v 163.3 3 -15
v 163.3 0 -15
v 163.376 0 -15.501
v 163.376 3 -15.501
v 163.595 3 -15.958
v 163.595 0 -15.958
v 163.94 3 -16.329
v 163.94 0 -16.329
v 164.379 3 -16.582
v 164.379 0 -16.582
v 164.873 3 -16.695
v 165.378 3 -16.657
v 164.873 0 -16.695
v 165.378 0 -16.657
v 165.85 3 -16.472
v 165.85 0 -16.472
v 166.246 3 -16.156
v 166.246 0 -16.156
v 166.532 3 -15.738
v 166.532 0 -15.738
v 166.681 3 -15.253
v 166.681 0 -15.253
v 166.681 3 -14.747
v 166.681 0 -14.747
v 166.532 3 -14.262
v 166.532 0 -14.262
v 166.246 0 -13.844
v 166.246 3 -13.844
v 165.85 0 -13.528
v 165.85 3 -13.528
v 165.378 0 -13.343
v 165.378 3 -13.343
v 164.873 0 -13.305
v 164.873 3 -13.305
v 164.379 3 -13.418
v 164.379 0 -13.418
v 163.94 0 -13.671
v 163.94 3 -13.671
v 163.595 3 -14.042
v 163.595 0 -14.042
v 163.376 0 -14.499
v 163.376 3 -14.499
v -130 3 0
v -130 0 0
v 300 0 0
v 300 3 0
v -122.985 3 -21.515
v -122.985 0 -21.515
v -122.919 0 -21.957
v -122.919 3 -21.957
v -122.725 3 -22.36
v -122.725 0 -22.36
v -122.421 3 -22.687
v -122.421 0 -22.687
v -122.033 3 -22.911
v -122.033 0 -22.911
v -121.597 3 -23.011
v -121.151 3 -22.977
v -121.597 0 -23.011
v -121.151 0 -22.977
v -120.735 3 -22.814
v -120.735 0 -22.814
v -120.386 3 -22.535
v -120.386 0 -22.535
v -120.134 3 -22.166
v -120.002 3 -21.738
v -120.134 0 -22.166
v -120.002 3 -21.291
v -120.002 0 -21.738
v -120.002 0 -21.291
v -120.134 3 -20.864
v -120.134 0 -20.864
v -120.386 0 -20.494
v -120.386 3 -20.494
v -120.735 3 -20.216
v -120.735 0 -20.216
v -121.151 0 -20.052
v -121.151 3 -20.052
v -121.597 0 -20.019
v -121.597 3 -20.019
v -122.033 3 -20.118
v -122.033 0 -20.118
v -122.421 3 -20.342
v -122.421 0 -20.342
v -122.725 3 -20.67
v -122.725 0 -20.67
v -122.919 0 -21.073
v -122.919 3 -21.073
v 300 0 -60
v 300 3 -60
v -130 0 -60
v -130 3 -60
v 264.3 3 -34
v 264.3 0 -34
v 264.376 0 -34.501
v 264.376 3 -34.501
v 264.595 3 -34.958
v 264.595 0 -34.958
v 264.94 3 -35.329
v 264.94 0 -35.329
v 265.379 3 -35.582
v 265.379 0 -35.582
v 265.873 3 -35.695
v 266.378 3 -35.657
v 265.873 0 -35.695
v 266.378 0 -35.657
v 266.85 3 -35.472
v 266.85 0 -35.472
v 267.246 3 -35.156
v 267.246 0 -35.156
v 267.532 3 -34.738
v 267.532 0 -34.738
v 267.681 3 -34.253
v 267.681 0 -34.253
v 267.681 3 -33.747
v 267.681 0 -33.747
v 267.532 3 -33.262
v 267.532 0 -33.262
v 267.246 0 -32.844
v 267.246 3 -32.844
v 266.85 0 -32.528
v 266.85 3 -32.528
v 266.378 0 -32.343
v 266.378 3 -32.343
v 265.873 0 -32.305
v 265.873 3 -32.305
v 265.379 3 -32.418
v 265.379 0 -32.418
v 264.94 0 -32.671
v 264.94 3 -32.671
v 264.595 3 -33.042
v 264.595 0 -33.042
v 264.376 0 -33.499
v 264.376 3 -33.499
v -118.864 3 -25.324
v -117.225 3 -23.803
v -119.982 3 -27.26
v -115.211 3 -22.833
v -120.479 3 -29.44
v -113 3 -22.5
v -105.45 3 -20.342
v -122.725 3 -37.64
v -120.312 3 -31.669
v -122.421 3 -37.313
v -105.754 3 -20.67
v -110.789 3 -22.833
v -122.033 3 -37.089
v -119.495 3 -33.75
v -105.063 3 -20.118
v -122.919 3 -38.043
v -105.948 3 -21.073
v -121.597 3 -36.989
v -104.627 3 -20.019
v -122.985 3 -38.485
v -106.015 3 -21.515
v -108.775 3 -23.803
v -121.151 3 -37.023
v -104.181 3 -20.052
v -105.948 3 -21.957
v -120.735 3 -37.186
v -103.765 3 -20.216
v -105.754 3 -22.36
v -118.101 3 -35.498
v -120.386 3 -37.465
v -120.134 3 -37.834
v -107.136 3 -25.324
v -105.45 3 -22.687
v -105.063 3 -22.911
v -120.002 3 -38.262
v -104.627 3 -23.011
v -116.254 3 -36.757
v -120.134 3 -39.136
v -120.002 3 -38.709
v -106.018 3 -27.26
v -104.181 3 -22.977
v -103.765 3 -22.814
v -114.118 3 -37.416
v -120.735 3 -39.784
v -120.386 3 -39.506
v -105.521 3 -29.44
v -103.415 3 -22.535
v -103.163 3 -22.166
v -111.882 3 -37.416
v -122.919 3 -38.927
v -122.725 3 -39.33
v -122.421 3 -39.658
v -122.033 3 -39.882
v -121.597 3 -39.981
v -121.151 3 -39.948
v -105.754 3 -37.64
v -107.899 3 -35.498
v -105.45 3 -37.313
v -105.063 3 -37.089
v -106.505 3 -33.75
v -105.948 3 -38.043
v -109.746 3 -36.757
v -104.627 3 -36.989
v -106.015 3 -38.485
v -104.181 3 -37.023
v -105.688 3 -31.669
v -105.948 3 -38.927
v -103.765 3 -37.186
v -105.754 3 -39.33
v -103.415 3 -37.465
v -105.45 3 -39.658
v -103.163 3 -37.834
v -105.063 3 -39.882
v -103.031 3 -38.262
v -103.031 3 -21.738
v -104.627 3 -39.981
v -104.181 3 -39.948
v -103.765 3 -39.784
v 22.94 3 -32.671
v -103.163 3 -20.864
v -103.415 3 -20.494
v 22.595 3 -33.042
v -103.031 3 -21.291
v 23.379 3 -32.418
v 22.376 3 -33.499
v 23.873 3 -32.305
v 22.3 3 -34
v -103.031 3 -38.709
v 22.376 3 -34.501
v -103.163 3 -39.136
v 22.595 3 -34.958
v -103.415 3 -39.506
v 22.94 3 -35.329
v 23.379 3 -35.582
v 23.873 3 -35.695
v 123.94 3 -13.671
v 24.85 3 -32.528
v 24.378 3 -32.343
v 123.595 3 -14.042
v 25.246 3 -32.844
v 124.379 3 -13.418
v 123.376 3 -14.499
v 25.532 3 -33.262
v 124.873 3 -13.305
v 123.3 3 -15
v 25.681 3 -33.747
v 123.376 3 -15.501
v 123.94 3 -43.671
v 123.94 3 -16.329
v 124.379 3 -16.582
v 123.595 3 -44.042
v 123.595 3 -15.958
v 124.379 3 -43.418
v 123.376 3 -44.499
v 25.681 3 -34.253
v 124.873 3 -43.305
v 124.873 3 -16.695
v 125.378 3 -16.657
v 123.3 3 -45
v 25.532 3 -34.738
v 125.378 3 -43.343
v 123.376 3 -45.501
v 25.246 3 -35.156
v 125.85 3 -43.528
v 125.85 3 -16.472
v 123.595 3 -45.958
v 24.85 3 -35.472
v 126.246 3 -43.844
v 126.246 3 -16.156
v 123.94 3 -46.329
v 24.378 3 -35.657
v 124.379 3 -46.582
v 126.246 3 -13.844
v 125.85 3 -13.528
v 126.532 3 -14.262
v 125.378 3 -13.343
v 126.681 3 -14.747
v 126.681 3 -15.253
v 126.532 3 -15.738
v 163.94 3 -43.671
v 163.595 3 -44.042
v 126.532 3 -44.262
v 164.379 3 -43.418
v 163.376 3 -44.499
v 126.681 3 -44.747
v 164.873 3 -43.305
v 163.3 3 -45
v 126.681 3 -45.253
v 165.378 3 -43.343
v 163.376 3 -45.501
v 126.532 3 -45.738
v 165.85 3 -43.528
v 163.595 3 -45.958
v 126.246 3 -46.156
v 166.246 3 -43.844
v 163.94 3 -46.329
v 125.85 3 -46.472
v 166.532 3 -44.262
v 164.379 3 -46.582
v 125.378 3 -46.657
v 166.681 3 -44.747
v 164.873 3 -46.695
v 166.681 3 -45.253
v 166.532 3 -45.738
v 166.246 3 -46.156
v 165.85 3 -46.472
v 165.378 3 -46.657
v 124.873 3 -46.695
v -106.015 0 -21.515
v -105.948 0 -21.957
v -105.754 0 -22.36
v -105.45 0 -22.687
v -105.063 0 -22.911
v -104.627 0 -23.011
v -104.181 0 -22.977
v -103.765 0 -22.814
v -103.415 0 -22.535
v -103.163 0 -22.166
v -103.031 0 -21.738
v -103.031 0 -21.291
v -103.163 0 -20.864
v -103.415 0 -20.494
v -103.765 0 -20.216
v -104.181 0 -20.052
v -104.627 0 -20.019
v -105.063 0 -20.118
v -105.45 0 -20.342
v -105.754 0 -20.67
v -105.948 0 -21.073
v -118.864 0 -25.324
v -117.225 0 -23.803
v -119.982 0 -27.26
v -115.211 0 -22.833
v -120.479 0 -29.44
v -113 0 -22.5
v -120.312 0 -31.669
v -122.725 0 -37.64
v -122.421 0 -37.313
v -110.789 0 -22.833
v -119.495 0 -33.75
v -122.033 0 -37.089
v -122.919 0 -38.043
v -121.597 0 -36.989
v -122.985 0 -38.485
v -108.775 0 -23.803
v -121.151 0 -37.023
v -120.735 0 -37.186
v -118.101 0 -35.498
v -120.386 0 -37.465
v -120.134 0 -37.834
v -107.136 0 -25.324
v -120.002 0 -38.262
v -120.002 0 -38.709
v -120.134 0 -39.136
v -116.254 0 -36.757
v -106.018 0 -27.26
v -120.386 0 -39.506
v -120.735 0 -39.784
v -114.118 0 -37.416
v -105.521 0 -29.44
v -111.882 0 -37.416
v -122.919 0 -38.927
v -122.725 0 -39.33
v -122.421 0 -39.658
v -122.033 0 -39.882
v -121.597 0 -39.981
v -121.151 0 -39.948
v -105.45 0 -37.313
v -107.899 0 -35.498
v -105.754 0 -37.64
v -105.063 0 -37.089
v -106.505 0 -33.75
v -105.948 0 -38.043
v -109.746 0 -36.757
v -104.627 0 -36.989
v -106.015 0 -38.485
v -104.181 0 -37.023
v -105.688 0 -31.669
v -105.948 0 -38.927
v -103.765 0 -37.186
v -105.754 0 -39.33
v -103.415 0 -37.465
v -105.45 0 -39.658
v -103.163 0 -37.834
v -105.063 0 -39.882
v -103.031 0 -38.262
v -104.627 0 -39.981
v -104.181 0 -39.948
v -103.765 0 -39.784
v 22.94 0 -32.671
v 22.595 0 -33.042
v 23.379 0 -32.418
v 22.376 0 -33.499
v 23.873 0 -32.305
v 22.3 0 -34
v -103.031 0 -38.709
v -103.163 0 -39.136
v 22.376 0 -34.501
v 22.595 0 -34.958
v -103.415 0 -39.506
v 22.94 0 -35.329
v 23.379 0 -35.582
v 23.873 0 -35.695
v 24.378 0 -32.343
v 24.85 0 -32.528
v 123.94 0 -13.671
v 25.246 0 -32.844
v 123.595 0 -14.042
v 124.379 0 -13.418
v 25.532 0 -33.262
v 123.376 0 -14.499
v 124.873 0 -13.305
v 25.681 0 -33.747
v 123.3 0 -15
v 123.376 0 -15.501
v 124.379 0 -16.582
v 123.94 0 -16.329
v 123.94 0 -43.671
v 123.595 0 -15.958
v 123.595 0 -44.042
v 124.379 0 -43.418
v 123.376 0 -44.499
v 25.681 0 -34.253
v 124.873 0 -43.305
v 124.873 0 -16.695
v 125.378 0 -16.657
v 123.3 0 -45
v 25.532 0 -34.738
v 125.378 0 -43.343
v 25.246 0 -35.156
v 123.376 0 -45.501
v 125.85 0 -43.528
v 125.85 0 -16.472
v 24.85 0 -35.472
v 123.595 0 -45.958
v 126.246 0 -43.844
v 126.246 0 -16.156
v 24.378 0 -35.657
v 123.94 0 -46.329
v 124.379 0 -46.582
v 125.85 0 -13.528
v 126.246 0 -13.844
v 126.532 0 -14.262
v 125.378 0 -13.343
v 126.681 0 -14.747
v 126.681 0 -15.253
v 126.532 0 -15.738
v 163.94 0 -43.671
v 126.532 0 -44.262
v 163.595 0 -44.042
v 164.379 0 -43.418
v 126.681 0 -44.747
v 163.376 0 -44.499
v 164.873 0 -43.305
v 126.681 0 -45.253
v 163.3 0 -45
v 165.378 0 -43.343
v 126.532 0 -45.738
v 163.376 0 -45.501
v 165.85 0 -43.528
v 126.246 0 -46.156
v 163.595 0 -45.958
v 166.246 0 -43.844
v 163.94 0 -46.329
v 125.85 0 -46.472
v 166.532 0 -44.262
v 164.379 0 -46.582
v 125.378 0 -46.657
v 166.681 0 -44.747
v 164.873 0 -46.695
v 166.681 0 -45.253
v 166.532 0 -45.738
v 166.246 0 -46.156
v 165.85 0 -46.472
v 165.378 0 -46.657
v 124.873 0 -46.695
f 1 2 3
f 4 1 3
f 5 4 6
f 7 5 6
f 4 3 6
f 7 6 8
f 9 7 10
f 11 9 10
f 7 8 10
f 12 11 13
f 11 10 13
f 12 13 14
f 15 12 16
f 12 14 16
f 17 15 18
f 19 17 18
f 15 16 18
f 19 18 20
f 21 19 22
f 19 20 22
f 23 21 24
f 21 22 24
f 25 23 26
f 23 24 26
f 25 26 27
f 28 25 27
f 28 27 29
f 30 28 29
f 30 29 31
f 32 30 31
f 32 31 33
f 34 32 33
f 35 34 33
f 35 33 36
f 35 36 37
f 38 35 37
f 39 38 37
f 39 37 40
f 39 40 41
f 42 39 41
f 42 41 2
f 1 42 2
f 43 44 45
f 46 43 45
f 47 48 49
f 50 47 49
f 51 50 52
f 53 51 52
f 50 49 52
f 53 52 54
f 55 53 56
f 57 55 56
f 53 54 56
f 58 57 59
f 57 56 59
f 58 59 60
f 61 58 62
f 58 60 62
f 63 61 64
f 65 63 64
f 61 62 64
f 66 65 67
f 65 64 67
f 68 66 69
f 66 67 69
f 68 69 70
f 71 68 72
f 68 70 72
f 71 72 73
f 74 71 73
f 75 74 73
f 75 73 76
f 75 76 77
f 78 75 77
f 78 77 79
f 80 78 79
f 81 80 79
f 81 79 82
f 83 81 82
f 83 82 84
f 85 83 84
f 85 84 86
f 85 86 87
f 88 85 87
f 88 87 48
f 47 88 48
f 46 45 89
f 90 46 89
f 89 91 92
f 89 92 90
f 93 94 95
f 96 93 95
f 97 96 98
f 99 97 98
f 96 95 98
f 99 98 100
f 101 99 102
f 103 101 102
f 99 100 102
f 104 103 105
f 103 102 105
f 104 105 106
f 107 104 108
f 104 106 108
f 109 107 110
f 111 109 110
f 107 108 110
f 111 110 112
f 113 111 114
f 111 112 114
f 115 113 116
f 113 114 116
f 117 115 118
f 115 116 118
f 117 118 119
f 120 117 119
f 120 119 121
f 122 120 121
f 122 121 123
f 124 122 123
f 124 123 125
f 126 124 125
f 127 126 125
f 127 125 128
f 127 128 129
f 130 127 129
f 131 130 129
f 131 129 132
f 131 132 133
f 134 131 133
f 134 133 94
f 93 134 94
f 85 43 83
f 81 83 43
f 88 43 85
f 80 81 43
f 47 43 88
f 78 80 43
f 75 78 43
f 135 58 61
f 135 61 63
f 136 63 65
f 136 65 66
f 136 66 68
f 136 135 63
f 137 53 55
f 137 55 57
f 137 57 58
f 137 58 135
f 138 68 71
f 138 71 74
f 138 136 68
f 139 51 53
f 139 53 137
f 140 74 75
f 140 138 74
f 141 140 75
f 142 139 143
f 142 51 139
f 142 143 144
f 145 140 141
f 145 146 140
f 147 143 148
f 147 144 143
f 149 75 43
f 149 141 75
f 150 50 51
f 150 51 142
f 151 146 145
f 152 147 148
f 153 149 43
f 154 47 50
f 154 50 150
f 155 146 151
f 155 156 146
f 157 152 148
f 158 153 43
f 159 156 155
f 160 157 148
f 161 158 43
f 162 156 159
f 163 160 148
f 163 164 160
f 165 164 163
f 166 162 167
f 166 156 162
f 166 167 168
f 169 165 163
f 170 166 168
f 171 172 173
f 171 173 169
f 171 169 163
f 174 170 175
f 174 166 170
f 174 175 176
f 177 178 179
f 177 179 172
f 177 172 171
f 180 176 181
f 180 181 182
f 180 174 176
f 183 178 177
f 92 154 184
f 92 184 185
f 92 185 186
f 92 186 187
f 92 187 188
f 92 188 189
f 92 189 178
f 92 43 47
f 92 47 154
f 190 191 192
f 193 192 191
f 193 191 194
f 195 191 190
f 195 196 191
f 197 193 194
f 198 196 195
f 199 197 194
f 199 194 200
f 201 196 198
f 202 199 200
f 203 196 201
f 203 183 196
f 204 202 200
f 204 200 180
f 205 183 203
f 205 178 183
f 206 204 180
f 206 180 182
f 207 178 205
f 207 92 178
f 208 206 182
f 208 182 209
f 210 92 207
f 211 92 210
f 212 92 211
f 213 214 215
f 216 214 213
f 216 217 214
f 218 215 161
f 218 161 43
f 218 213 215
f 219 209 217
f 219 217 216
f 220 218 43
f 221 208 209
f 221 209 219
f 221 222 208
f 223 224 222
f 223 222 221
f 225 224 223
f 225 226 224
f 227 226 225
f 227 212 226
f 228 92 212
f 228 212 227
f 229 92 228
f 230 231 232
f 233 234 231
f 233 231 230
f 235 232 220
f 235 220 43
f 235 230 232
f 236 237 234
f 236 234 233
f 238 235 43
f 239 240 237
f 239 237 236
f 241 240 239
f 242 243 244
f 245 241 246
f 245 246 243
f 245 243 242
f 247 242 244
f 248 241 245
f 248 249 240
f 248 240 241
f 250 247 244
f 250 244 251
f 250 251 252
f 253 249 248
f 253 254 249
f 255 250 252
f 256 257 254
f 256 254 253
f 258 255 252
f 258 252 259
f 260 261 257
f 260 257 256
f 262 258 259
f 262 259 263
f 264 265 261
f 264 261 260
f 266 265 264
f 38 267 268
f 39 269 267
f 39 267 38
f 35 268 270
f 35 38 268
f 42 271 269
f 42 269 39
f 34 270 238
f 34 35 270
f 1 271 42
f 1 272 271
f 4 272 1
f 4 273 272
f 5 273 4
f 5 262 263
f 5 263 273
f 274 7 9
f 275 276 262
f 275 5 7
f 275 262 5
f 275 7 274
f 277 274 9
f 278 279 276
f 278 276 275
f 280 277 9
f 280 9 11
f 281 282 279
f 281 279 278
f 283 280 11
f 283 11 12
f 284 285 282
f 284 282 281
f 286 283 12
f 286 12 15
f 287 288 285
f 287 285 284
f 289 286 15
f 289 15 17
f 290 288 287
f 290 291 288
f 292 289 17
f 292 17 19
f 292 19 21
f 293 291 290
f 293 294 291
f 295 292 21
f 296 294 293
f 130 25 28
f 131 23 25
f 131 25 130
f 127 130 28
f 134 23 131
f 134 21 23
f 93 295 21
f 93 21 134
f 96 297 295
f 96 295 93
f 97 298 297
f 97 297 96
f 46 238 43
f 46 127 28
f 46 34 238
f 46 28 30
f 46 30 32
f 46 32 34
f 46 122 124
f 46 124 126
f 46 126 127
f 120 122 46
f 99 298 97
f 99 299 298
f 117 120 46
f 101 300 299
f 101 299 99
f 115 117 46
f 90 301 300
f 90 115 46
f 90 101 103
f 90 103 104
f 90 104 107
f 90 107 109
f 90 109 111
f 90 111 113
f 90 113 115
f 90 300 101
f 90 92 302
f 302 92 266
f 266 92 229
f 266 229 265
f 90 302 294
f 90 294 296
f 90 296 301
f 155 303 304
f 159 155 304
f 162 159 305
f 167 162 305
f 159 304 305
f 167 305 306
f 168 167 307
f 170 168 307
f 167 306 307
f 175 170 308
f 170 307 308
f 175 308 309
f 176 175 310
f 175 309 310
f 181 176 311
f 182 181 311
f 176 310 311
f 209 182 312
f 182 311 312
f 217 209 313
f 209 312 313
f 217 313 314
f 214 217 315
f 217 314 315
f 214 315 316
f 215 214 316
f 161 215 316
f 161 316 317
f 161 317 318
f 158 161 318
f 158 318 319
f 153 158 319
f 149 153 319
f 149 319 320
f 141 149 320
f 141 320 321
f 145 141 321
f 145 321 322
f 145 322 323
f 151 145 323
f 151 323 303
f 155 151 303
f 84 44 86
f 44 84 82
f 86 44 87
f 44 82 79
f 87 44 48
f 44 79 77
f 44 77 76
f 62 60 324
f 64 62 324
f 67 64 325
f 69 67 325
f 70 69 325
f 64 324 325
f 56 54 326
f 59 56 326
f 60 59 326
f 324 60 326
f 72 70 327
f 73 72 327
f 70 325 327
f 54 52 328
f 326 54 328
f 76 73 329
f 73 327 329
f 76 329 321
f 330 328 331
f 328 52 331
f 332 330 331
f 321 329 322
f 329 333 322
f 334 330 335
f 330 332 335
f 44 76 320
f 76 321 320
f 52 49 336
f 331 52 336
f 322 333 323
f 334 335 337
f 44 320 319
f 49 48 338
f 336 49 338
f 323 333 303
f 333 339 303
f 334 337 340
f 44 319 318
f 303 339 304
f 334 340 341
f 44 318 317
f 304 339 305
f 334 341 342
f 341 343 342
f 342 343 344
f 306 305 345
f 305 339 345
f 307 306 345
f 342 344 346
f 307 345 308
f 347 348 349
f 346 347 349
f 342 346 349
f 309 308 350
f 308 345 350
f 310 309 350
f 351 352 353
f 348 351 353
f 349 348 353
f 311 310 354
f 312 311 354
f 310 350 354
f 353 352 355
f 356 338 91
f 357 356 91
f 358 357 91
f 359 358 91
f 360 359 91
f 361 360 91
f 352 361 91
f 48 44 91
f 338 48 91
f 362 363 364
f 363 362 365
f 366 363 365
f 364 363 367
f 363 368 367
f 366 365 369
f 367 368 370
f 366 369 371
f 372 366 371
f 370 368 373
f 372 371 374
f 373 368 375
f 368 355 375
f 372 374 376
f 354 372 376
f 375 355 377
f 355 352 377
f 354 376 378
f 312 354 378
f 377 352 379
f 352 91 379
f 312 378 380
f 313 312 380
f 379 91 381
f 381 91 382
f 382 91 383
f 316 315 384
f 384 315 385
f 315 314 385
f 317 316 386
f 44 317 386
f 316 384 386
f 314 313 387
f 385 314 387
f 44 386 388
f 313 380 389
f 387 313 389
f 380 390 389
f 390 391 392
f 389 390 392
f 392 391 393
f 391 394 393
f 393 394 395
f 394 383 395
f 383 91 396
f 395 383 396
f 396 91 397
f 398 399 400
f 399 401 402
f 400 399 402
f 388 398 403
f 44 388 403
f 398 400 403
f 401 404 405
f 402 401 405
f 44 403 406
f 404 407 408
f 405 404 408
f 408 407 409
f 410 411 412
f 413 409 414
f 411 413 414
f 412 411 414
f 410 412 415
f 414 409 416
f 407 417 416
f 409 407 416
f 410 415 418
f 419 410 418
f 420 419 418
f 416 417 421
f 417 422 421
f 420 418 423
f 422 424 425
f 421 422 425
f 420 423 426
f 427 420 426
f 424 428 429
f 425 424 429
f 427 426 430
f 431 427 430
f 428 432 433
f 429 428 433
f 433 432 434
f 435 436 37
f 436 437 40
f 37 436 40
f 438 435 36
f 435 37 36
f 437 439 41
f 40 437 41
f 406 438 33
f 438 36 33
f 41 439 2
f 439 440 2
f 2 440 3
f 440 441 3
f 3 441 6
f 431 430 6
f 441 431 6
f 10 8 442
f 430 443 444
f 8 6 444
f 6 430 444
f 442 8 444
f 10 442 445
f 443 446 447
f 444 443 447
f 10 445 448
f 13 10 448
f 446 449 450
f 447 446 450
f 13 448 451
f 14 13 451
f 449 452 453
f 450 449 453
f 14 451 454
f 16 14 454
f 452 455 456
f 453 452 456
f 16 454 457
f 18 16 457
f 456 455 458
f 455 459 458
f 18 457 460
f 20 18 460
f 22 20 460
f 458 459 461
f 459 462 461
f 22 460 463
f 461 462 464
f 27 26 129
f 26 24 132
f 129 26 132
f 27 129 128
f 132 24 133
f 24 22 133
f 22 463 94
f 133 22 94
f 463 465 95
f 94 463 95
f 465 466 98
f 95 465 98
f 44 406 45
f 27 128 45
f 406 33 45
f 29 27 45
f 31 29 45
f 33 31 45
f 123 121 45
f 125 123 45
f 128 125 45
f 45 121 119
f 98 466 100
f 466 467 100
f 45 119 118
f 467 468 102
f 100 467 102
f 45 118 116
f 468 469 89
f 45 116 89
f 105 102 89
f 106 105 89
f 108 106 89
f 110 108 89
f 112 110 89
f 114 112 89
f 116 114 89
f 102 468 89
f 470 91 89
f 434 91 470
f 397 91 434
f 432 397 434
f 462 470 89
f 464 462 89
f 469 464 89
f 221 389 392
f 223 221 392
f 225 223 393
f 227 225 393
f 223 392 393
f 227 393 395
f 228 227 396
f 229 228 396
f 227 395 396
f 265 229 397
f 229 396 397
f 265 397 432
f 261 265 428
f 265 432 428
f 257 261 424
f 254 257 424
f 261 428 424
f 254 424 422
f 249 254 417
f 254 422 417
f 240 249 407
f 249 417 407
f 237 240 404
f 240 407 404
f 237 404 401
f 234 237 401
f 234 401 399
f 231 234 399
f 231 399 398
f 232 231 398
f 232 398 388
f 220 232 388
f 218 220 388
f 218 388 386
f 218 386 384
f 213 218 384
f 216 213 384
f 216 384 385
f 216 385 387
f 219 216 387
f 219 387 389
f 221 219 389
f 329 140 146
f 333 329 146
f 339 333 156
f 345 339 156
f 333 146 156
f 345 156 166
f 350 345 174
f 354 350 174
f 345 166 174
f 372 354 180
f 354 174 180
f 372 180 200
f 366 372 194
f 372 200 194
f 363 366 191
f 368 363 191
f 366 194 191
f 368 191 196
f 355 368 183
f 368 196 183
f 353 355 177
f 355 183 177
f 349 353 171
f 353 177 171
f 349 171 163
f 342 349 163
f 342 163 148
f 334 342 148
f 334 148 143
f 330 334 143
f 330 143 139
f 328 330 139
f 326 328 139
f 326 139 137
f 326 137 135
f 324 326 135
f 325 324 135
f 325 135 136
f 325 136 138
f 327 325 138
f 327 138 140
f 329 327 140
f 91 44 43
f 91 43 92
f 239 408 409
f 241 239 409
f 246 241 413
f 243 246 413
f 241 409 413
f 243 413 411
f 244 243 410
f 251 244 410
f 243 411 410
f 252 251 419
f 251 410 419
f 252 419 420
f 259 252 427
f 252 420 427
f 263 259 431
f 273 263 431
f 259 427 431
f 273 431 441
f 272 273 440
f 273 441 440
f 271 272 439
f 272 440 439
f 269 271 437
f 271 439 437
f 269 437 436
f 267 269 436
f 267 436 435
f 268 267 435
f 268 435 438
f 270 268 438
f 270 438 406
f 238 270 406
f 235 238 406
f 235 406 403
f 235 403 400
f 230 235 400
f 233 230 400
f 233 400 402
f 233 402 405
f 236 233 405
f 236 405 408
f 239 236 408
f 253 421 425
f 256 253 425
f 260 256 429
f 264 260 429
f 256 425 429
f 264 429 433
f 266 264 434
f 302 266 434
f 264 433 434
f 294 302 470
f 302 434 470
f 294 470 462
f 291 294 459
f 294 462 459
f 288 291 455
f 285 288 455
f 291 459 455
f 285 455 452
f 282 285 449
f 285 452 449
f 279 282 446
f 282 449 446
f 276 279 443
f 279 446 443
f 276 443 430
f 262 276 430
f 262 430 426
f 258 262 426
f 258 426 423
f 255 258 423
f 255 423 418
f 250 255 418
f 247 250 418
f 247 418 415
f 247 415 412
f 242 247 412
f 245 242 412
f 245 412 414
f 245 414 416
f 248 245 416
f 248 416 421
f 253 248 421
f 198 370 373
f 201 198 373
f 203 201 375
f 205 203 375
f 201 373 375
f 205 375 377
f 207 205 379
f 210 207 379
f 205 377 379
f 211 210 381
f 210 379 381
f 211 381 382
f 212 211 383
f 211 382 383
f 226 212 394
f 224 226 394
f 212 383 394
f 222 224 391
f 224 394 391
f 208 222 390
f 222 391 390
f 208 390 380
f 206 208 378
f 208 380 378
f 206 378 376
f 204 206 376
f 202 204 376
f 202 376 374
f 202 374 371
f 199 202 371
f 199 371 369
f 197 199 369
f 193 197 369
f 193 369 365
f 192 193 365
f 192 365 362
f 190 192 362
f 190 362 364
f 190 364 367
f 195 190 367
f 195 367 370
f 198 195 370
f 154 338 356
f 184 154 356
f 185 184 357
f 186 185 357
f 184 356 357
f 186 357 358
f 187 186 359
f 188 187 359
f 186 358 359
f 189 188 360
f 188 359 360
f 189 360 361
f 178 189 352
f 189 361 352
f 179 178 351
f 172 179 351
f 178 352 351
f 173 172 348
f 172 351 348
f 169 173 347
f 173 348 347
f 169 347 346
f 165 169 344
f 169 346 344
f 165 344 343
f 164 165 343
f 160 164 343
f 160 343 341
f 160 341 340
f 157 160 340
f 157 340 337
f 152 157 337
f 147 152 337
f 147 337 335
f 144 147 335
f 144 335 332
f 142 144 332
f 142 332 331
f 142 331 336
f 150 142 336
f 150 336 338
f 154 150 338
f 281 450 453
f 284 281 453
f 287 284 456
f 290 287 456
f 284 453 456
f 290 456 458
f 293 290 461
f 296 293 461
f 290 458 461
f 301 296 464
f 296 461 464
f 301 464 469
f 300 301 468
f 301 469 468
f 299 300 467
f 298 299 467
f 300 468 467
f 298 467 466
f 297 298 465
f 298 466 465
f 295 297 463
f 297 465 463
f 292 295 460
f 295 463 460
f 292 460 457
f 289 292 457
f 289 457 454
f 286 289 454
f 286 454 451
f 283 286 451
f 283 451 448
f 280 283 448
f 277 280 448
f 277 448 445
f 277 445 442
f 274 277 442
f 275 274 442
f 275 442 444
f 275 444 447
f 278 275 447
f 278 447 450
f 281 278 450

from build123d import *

# Parameters (mm, degrees)
SKETCH1_W                 = 430
SKETCH1_H                 = 60
BOSS_EXTRUDE1_DEPTH       = 3
OTW_R_POD_RUB_M31_D       = 3.4
SKETCH4_R                 = 7.5
CUT_EXTRUDE1_DEPTH        = 5
F_3_0MM_DOWEL_HOLE1_D     = 3
F_3_0MM_DOWEL_HOLE1_DEPTH = 6
F_3_0MM_DOWEL_HOLE1_TIP   = 0.901290929


with BuildPart() as part:
    # Sketch1 → Boss-Extrude1 (new body)
    with BuildSketch(Plane(origin=(0, 0, 0), x_dir=(1, 0, 0), z_dir=(0, 1, 0))):
        with Locations((85, 30)):
            Rectangle(SKETCH1_W, SKETCH1_H)
    extrude(amount=BOSS_EXTRUDE1_DEPTH)

    # Otwór pod śrubę M31 (through all)
    with Locations(Plane(origin=(0, 3, 0), x_dir=(1, 0, 0), z_dir=(0, 1, 0))):
        with Locations((266, 34), (24, 34), (125, 15), (165, 15), (165, 45), (125, 45)):
            Hole(OTW_R_POD_RUB_M31_D / 2)

    # Sketch4 → Cut-Extrude1 (cut)
    with BuildSketch(Plane(origin=(0, 3, 0), x_dir=(1, 0, 0), z_dir=(0, 1, 0))):
        with Locations(Location((-113, 30, 0), (0, 0, 270))):
            Circle(SKETCH4_R)
    extrude(amount=-CUT_EXTRUDE1_DEPTH, mode=Mode.SUBTRACT)

    # Ø3.0mm Dowel Hole1
    with Locations(Plane(origin=(0, 3, 0), x_dir=(1, 0, 0), z_dir=(0, 1, 0))):
        with Locations((-104.514718626, 21.514718626), (-104.514718626, 38.485281374), (-121.485281374, 21.514718626), (-121.485281374, 38.485281374)):
            Hole(F_3_0MM_DOWEL_HOLE1_D / 2, depth=F_3_0MM_DOWEL_HOLE1_DEPTH)
            with Locations((0, 0, -(F_3_0MM_DOWEL_HOLE1_DEPTH + F_3_0MM_DOWEL_HOLE1_TIP / 2))):  # 118° drill point
                Cone(0, F_3_0MM_DOWEL_HOLE1_D / 2, F_3_0MM_DOWEL_HOLE1_TIP, mode=Mode.SUBTRACT)


solid = part.part
